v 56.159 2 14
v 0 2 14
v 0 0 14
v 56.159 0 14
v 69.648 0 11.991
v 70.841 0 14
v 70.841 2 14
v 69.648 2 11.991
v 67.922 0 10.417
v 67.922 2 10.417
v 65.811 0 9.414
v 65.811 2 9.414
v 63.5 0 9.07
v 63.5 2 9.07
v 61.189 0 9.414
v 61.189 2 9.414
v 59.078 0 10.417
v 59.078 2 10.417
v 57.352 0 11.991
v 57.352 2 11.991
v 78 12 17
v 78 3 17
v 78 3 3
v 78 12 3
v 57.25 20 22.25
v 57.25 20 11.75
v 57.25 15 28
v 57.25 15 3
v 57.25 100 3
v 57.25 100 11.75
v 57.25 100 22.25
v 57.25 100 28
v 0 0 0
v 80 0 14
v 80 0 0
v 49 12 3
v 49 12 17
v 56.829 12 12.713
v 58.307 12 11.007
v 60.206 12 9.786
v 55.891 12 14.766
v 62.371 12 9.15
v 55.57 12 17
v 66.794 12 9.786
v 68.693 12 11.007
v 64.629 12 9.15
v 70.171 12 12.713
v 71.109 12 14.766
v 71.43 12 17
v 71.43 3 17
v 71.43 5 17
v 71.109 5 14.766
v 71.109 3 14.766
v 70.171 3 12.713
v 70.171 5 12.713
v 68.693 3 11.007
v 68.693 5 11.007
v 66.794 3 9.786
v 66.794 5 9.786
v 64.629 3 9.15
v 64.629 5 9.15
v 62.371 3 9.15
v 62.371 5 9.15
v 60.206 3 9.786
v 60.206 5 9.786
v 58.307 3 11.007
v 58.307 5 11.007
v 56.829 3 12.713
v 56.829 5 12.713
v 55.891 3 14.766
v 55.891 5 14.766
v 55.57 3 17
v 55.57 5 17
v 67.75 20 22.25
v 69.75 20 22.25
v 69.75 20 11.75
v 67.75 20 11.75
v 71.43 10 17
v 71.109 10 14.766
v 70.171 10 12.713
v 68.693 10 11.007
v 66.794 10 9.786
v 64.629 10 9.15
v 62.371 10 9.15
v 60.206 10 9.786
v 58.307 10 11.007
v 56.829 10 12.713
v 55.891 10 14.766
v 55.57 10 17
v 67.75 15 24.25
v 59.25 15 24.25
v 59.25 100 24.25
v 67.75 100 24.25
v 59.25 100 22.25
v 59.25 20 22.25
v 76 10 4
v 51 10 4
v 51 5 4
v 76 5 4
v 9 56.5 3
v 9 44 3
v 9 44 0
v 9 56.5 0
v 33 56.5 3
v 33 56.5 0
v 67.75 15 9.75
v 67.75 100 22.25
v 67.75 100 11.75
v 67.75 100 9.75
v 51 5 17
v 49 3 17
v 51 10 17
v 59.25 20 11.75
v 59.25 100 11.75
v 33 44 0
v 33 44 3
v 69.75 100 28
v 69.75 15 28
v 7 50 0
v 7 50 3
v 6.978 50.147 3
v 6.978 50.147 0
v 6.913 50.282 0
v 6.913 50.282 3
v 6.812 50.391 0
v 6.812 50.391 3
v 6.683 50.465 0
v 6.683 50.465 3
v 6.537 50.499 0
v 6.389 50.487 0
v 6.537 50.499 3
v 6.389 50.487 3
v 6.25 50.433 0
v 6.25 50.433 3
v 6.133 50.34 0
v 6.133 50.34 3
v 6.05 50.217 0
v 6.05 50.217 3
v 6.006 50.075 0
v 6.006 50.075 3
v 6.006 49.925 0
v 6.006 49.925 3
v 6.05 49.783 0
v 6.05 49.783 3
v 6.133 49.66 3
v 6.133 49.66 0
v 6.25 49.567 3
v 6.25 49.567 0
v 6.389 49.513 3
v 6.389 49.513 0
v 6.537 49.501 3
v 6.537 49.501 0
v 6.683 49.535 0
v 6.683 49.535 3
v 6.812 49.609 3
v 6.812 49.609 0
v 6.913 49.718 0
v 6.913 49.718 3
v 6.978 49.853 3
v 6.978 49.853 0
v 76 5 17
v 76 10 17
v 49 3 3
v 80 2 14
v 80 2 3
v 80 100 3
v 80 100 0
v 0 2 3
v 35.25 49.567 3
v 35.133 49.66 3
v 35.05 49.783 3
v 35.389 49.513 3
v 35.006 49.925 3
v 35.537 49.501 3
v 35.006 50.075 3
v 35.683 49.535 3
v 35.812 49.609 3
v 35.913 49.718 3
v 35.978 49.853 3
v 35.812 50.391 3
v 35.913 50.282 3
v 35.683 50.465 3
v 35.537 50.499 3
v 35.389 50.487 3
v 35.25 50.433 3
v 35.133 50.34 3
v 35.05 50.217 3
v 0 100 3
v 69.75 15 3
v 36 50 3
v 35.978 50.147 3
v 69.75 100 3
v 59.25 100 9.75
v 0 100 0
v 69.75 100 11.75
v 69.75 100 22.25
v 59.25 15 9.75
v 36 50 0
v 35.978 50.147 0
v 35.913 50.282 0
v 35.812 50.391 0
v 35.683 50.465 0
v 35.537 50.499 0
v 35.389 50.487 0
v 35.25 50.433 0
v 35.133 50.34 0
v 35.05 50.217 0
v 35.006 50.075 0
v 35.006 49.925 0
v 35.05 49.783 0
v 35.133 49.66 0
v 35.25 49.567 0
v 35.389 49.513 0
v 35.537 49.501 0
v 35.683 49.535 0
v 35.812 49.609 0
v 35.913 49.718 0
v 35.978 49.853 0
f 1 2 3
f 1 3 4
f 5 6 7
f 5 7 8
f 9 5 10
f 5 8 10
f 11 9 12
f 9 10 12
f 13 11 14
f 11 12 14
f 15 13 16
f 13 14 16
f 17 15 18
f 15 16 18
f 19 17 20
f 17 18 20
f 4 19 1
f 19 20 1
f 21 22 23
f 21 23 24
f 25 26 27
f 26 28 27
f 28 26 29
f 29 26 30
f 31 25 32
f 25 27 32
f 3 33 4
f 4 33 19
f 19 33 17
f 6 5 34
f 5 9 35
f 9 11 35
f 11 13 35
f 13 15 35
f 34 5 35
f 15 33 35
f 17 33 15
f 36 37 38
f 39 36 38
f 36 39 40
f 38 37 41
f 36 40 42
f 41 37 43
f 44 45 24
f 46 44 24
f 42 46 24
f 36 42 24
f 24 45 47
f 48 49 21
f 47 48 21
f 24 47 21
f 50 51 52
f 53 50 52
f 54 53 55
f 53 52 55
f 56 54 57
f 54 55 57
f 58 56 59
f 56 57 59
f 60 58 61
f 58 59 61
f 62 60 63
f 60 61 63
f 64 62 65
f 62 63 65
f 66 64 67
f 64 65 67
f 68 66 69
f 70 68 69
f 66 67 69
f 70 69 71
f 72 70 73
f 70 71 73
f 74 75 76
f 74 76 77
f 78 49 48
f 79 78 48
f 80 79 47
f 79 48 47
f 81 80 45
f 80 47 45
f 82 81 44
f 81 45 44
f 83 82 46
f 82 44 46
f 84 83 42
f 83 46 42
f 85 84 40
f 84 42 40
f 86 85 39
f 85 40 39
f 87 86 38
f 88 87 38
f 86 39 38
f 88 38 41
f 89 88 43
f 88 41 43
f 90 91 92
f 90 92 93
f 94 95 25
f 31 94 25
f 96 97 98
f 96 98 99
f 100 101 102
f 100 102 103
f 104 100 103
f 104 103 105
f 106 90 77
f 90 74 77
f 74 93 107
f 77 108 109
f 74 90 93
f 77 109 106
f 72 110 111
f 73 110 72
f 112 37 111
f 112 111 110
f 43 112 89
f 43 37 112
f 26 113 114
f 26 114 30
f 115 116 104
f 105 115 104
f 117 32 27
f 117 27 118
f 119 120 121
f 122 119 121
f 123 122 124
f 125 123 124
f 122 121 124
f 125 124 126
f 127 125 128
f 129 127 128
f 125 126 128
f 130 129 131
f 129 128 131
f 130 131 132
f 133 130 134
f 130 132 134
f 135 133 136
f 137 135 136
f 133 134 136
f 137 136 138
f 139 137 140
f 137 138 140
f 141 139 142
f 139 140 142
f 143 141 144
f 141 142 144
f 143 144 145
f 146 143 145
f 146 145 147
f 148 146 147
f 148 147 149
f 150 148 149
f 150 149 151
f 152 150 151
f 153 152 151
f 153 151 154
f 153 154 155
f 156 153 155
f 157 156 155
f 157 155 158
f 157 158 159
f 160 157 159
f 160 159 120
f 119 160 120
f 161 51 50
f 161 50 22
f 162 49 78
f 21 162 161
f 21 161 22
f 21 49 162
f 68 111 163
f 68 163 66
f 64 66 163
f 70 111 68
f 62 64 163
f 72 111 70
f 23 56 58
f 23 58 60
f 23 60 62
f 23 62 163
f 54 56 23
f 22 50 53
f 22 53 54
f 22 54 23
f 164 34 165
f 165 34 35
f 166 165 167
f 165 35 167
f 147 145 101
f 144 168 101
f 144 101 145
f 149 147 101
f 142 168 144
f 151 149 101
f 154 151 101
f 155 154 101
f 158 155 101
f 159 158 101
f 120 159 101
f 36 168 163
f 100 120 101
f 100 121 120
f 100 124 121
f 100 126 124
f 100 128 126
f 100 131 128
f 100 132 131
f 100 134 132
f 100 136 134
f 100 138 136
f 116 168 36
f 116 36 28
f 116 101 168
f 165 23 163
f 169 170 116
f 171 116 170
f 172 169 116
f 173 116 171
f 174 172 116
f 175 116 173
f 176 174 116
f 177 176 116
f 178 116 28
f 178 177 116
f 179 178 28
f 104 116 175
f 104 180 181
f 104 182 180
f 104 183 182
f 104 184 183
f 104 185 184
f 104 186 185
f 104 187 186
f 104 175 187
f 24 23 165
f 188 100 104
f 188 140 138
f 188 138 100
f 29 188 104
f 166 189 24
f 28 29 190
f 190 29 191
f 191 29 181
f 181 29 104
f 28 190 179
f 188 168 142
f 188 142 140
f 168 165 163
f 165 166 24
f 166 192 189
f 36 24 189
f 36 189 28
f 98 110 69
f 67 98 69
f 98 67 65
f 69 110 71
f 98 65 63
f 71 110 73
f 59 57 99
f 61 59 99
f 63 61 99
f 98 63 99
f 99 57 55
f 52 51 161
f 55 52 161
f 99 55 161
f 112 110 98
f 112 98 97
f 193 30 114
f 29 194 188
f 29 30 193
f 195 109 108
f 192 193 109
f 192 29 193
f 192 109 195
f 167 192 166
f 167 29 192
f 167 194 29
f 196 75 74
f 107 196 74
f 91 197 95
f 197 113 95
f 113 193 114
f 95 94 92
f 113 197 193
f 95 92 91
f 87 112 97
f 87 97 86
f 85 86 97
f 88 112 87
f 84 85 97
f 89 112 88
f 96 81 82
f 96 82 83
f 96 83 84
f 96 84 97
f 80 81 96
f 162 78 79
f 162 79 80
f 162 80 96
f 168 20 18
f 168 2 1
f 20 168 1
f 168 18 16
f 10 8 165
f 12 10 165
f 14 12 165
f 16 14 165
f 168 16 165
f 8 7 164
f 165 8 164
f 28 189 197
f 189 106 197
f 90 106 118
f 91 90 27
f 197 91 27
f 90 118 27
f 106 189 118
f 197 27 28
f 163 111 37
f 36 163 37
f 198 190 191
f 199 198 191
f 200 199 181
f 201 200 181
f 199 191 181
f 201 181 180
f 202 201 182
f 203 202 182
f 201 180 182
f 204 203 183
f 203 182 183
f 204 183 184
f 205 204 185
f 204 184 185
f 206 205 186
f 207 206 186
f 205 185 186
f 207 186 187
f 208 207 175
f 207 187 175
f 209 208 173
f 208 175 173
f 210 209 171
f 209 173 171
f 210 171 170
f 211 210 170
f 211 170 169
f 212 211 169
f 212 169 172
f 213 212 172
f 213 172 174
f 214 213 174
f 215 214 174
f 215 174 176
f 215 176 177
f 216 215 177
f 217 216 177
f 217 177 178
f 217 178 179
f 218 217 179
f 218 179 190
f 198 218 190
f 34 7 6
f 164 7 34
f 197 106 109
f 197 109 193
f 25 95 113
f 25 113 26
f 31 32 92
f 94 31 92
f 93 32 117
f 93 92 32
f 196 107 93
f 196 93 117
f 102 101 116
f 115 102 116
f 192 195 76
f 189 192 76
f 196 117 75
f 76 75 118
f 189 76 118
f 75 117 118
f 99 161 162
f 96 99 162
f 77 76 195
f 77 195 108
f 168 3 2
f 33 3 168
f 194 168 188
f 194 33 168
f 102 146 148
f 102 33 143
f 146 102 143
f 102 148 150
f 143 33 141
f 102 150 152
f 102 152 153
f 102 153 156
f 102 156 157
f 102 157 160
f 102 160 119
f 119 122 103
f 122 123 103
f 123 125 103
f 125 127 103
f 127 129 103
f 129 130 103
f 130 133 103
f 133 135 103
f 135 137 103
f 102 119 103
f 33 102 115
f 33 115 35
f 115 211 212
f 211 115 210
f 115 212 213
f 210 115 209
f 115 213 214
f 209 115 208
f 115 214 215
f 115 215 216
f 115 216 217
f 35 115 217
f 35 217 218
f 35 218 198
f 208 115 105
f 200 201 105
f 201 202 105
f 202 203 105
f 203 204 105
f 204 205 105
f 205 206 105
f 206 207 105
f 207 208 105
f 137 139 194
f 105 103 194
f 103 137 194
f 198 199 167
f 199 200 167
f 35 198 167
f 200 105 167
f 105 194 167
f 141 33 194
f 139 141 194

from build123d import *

# Parameters (mm, degrees)
F0_W      = 80
F0_H      = 100
F1_DEPTH  = 34
F2_W      = 29
F2_H      = 9
F2_W_2    = 36
F2_H_2    = 16.5
F4_DEPTH  = 31
F5_DEPTH  = 85
F3_W      = 2
F3_H      = 10.5
F6_DEPTH  = 80
F2_W_3    = 24
F2_H_3    = 12.5
F2_R      = 0.5
F7_DEPTH  = 37
F8_DEPTH  = 31
F2_W_4    = 25
F2_H_4    = 5
F9_DEPTH  = 30
F10_DEPTH = 17
F12_DEPTH = 15
F13_DEPTH = 6
F14_DEPTH = 20


with BuildPart() as f1:
    # F0 (on Top) → F1 (new body)
    with BuildSketch(Plane.XY):
        with Locations((40, 50)):
            Rectangle(F0_W, F0_H)
    extrude(amount=F1_DEPTH)

    # F2 (on face) → F4 (cut)
    with BuildSketch(Plane.XY.offset(34)):
        Polygon((57.25, 15), (57.25, 100), (0, 100), (0, 2), (80, 2), (80, 100), (69.75, 100), (69.75, 15), align=None)
        with Locations((63.5, 7.5)):
            Rectangle(F2_W, F2_H, mode=Mode.SUBTRACT)
        with Locations((21, 50.25)):
            Rectangle(F2_W_2, F2_H_2, mode=Mode.SUBTRACT)
    extrude(amount=-F4_DEPTH, mode=Mode.SUBTRACT)

    # F3 (on face) → F5 (cut)
    with BuildSketch(Plane(origin=(0, 100, 0), x_dir=(-1, 0, 0), z_dir=(0, 1, 0))):
        Polygon((-67.75, 11.75), (-67.75, 9.75), (-59.25, 9.75), (-59.25, 11.75), (-59.25, 22.25), (-59.25, 24.25), (-67.75, 24.25), (-67.75, 22.25), align=None)
    extrude(amount=-F5_DEPTH, mode=Mode.SUBTRACT)

    # F3 (on face) → F6 (cut)
    with BuildSketch(Plane(origin=(0, 100, 0), x_dir=(-1, 0, 0), z_dir=(0, 1, 0))):
        with Locations((-58.25, 17)):
            Rectangle(F3_W, F3_H)
        with Locations((-68.75, 17)):
            Rectangle(F3_W, F3_H)
    extrude(amount=-F6_DEPTH, mode=Mode.SUBTRACT)

    # F2 (on face) → F7 (cut)
    with BuildSketch(Plane.XY.offset(34)):
        with Locations((21, 50.25)):
            Rectangle(F2_W_3, F2_H_3)
        with Locations((6.5, 50)):
            Circle(F2_R)
        with Locations((35.5, 50)):
            Circle(F2_R)
    extrude(amount=-F7_DEPTH, mode=Mode.SUBTRACT)

    # F2 (on face) → F8 (cut)
    with BuildSketch(Plane.XY.offset(34)):
        with Locations((21, 50.25)):
            Rectangle(F2_W_2, F2_H_2)
        with Locations((6.5, 50)):
            Circle(F2_R, mode=Mode.SUBTRACT)
        with Locations((21, 50.25)):
            Rectangle(F2_W_3, F2_H_3, mode=Mode.SUBTRACT)
        with Locations((35.5, 50)):
            Circle(F2_R, mode=Mode.SUBTRACT)
    extrude(amount=-F8_DEPTH, mode=Mode.SUBTRACT)

    # F2 (on face) → F9 (cut)
    with BuildSketch(Plane.XY.offset(34)):
        with Locations((63.5, 7.5)):
            Rectangle(F2_W_4, F2_H_4)
    extrude(amount=-F9_DEPTH, mode=Mode.SUBTRACT)

    # F2 (on face) → F10 (cut)
    with BuildSketch(Plane.XY.offset(34)):
        with Locations((63.5, 7.5)):
            Rectangle(F2_W, F2_H)
        with Locations((63.5, 7.5)):
            Rectangle(F2_W_4, F2_H_4, mode=Mode.SUBTRACT)
    extrude(amount=-F10_DEPTH, mode=Mode.SUBTRACT)

    # F11 (on face) → F12 (cut)
    with BuildSketch(Plane(origin=(0, 12, 0), x_dir=(-1, 0, 0), z_dir=(0, 1, 0))):
        with BuildLine():
            ThreePointArc((-71.4303621394, 17), (-63.5, 9.0696378606), (-55.5696378606, 17))
            Line((-55.5696378606, 17), (-71.4303621394, 17))
        make_face()
    extrude(amount=-F12_DEPTH, mode=Mode.SUBTRACT)

    # F13 (cut): a face of the model
    f13_faces = [f1.faces().sort_by_distance(p)[0] for p in [
        (63.5, 57.5, 34),
    ]]
    extrude(f13_faces, amount=-F13_DEPTH, mode=Mode.SUBTRACT)

    # F14 (cut): a face of the model
    f14_faces = [f1.faces().sort_by_distance(p)[0] for p in [
        (40, 1, 34),
    ]]
    extrude(f14_faces, amount=-F14_DEPTH, mode=Mode.SUBTRACT)


solid = f1.part
